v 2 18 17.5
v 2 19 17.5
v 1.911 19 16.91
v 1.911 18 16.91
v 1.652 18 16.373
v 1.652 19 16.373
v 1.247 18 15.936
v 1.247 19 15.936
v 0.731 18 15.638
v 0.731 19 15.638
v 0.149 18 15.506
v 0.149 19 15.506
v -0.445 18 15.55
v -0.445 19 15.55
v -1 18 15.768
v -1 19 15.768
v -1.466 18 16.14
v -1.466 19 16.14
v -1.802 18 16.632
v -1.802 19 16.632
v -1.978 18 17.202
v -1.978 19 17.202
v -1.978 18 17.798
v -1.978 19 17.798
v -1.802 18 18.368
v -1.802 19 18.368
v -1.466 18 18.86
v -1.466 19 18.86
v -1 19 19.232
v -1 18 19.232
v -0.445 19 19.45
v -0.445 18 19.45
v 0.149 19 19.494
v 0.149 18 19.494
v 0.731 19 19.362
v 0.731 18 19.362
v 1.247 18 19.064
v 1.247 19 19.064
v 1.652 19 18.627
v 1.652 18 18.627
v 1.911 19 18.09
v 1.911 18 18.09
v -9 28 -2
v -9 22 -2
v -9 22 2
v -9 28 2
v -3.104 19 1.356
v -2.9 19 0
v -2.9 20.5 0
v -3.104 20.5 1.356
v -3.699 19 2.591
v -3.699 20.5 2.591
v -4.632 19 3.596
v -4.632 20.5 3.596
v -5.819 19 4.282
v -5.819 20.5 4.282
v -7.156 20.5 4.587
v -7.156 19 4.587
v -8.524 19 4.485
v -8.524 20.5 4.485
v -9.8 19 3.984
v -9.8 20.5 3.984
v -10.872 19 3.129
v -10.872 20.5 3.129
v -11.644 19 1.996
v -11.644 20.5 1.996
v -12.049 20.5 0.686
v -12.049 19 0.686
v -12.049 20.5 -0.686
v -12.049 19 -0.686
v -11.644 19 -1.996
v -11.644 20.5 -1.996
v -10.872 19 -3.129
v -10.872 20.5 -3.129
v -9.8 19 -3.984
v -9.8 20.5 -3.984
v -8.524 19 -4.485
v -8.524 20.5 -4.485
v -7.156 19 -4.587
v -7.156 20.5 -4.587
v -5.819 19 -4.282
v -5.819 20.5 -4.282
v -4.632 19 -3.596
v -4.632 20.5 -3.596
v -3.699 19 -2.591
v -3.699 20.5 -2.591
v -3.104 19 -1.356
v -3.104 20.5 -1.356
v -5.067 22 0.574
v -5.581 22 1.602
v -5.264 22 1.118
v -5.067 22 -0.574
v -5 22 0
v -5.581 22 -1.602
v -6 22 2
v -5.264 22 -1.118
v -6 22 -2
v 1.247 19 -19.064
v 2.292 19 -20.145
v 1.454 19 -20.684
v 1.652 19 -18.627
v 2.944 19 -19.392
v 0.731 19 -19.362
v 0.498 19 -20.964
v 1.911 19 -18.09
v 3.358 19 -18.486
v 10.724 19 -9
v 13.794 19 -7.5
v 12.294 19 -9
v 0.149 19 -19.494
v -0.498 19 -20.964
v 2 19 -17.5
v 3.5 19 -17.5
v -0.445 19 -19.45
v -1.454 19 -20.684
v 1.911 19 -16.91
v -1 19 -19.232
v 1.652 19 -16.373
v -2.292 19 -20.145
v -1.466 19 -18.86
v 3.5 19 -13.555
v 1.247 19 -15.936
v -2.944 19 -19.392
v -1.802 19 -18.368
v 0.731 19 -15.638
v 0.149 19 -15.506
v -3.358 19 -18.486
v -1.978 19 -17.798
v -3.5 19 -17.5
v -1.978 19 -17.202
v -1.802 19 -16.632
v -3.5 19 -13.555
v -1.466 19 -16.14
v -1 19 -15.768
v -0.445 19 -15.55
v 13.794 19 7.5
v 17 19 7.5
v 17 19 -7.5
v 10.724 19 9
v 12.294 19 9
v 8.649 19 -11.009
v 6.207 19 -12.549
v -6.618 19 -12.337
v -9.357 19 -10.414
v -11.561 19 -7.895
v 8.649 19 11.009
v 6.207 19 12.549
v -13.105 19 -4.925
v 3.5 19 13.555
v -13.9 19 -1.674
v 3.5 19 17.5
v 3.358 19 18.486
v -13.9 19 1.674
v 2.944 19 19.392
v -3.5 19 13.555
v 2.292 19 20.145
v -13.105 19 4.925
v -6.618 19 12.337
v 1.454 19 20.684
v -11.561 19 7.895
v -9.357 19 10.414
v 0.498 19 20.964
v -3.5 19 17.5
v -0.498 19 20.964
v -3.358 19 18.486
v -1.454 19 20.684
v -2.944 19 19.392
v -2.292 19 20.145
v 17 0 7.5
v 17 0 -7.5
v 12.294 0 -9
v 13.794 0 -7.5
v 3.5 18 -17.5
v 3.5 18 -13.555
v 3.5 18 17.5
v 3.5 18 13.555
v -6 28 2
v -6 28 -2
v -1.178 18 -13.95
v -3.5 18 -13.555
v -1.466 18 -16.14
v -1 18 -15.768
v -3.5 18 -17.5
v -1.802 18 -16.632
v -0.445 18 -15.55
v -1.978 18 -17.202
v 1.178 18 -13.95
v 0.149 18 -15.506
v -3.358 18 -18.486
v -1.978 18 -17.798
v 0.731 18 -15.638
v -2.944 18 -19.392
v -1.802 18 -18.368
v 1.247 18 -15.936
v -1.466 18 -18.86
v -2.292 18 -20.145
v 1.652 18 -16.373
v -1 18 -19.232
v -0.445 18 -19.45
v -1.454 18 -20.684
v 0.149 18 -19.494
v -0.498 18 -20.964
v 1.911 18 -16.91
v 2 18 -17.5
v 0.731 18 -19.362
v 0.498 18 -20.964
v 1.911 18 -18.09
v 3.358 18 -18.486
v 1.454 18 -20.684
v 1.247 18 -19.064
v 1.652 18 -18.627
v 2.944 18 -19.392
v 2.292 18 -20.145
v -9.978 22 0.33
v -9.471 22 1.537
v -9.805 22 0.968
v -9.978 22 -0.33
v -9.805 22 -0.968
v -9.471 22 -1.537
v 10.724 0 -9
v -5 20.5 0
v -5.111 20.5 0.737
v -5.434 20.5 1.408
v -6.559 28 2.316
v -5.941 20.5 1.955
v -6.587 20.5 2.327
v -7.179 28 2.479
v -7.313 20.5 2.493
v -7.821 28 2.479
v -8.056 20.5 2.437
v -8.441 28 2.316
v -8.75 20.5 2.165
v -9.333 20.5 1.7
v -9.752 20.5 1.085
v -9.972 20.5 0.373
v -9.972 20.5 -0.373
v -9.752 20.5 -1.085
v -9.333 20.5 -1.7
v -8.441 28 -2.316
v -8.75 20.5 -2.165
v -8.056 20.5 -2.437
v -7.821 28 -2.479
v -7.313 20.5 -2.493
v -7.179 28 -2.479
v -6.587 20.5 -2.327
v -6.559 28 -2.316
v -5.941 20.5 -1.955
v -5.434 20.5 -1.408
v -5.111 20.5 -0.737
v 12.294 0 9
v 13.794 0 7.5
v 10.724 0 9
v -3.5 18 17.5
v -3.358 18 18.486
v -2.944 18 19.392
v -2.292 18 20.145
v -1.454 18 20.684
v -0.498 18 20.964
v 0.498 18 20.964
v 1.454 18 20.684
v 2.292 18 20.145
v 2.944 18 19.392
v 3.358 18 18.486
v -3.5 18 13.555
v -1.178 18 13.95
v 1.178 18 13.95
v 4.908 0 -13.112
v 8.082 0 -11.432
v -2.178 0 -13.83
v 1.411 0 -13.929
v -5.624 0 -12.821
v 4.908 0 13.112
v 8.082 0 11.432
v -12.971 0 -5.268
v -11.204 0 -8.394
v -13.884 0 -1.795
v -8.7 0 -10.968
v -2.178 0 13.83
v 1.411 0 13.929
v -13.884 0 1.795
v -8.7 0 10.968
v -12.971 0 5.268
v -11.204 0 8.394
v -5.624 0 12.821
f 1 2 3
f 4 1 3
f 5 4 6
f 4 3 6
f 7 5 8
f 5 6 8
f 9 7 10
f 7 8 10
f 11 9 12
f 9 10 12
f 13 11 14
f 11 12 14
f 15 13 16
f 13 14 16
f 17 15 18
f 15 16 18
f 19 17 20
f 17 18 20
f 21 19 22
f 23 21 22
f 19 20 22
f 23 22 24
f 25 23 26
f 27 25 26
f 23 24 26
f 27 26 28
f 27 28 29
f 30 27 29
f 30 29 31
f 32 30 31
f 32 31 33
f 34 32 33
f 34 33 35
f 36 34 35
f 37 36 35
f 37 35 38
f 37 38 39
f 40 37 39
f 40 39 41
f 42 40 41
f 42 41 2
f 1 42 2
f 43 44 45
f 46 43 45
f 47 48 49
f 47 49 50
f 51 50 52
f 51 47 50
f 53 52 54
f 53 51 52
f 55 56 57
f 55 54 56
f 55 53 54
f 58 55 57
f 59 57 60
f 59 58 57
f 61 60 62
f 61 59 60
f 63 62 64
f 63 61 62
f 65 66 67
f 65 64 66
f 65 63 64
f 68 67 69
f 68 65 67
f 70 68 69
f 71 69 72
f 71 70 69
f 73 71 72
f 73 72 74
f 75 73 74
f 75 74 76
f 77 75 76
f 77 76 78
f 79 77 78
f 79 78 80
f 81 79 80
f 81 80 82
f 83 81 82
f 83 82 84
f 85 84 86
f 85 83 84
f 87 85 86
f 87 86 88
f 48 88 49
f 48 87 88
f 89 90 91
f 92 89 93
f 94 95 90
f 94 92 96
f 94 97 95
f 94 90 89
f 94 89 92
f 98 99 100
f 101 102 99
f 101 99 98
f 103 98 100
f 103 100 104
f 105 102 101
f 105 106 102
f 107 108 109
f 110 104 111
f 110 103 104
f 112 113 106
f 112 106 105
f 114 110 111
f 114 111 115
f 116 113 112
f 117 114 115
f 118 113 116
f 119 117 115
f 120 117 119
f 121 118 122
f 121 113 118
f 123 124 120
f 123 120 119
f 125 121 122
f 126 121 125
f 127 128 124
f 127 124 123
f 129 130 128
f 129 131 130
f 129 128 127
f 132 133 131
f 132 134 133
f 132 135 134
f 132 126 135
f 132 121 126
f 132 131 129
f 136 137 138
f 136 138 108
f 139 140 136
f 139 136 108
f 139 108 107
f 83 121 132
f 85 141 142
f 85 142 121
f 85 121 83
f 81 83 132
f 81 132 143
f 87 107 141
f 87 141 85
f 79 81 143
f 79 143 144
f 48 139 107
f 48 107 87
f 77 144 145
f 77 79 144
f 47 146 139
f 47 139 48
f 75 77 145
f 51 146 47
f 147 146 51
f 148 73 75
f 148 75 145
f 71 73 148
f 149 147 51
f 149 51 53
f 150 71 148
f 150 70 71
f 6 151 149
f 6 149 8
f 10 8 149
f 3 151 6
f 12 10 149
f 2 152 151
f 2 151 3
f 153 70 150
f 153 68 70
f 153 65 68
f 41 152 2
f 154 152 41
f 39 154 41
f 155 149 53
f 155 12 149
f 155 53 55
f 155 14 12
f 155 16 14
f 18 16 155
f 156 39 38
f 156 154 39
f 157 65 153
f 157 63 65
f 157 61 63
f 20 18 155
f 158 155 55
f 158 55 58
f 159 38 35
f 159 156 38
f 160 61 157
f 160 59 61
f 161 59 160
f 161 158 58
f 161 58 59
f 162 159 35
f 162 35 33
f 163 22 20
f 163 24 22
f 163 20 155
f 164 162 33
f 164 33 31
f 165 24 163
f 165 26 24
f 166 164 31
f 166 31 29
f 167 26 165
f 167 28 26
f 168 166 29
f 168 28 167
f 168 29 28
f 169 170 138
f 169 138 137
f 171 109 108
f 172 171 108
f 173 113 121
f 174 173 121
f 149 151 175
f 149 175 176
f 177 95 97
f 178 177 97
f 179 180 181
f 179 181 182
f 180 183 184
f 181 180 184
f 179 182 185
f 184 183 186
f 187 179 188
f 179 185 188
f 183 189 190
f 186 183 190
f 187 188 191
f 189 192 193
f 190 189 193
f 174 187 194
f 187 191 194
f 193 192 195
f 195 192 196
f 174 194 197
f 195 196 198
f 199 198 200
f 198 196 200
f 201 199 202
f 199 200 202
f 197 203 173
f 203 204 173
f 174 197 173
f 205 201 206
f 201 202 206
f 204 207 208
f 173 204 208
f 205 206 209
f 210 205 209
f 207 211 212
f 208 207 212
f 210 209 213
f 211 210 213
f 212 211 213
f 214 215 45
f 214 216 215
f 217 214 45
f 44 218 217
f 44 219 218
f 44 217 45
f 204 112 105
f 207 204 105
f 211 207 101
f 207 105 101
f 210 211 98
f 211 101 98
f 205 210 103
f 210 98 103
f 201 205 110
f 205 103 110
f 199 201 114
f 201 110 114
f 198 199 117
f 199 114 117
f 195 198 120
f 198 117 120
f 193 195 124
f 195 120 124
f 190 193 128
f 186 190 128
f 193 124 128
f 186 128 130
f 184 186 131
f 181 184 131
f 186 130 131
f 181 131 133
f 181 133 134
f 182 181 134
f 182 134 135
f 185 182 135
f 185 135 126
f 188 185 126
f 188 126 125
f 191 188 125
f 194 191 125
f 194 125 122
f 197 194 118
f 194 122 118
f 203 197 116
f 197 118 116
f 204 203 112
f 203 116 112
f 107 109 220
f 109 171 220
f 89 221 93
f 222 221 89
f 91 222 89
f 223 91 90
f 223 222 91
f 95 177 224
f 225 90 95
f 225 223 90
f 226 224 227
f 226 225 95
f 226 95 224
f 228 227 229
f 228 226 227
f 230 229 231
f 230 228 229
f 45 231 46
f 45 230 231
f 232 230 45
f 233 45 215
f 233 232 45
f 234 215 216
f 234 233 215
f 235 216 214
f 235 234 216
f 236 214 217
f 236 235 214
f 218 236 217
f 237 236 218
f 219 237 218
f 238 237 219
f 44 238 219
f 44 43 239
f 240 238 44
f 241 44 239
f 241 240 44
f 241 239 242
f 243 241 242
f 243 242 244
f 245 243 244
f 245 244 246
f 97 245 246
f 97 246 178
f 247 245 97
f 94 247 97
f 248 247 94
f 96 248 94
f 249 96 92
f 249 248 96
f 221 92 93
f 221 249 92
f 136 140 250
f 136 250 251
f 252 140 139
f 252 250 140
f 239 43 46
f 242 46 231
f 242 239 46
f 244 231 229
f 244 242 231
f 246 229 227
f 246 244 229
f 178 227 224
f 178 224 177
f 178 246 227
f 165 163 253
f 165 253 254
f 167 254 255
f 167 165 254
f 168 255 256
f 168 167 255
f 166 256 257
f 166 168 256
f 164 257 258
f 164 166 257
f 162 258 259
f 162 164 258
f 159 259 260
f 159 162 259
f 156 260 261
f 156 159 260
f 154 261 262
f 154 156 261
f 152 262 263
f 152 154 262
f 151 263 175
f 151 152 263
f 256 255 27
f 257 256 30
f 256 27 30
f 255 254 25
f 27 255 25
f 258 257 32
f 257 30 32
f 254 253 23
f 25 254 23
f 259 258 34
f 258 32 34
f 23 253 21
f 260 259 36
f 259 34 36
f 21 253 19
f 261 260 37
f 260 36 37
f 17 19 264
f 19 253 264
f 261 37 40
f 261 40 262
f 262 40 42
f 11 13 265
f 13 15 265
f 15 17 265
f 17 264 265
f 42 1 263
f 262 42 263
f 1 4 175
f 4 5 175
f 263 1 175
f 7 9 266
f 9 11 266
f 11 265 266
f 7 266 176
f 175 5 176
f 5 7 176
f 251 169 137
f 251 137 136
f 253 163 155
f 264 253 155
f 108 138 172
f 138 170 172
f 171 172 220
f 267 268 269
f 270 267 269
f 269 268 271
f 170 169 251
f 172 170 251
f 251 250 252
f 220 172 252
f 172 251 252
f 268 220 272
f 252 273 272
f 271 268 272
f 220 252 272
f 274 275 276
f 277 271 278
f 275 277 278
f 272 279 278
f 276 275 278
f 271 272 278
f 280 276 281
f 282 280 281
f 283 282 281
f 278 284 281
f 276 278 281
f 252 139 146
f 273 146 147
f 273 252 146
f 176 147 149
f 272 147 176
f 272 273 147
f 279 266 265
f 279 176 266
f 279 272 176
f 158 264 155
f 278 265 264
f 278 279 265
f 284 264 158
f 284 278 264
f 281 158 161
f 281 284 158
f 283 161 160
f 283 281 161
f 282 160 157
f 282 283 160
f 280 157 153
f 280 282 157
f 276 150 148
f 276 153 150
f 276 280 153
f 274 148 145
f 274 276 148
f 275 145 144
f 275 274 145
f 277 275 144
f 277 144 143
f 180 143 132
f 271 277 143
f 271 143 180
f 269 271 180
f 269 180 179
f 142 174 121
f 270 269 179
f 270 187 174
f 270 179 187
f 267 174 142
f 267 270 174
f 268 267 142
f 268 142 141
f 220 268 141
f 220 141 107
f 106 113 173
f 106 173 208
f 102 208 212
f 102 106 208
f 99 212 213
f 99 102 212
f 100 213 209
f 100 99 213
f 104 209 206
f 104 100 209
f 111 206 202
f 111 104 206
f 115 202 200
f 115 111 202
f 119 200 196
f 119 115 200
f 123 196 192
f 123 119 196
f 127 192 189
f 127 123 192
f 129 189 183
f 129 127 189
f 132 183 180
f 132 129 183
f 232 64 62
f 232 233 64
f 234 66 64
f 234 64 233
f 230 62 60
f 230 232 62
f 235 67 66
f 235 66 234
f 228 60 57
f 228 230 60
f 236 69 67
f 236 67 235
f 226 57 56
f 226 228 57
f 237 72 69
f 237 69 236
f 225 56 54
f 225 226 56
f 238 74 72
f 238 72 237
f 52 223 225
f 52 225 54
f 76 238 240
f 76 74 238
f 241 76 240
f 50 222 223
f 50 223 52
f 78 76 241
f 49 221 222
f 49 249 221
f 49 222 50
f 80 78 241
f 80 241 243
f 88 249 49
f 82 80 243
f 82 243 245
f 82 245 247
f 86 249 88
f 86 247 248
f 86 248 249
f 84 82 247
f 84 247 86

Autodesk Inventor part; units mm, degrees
ref_plane "YZ Plane" through (0, 0, 0) normal (1, 0, 0) x (0, 1, 0)
ref_plane "XZ Plane" through (0, 0, 0) normal (0, 1, 0) x (-1, 0, 0)
ref_plane "XY Plane" through (0, 0, 0) normal (0, 0, 1) x (1, 0, 0)
sketch "Sketch1" plane through (0, 0, 0) normal (0, 1, 0) x (-1, 0, 0)
  line L0 (-12.2941, 0) -> (-17, 0)
  line L1 (-17, 0) -> (-17, 7.5)
  line L2 (0, 0) -> (-12.2941, 0)
  line L3 (-12.2941, 9) -> (-10.7238, 9)
  line L4 (-12.2941, 9) -> (-13.7941, 7.5)
  line L5 (-12.2941, 9) -> (-9.8817, 9) construction
  arc A0 (-10.7238, -9) -> (-10.7238, 9) centre (0, 0) ccw
  line L6 (-17, 7.5) -> (-13.7941, 7.5)
  line L7 (-17, 0) -> (-17, -7.5)
  line L8 (-12.2941, -9) -> (-10.7238, -9)
  line L9 (-12.2941, -9) -> (-13.7941, -7.5)
  line L10 (-12.2941, -9) -> (-9.8817, -9) construction
  line L11 (-17, -7.5) -> (-13.7941, -7.5)
  dimension "d3" = 9
  dimension "d4" = 135
extrude "Extrusion1" add sketch "Sketch1" along normal blind 19
sketch "Sketch2" plane through (0, 19, 0) normal (0, 1, 0) x (1, 0, 0)
  circle A0 centre (-7.5, 0) radius 4.6
  circle A1 centre (-7.5, 0) radius 2.5
  arc A2 (10.7238, 9) -> (10.7238, -9) centre (0, 0) ccw projected
  line L0 (-6, -2) -> (-6, 2)
  line L1 (-9, 2) -> (-9, -2)
  circle A3 centre (0, -17.5) radius 2
  arc A4 (-3.5, -17.5) -> (3.5, -17.5) centre (0, -17.5) ccw
  line L2 (-3.5, -17.5) -> (-3.5, -13.5554)
  line L3 (3.5, -17.5) -> (3.5, -13.5554)
  arc A5 (-3.5, -13.5554) -> (3.5, -13.5554) centre (0, 0) ccw
  line L4 (0, 0) -> (2, 0)
  arc A6 (10.7238, 9) -> (10.7238, -9) centre (0, 0) ccw
  circle A7 centre (0, 17.5) radius 2
  arc A8 (3.5, 17.5) -> (-3.5, 17.5) centre (0, 17.5) ccw
  line L5 (-3.5, 17.5) -> (-3.5, 13.5554)
  line L6 (3.5, 17.5) -> (3.5, 13.5554)
  arc A9 (3.5, 13.5554) -> (-3.5, 13.5554) centre (0, 0) ccw
  point P0 (-7.5, -3.3735)
  dimension "d7" = 5
  dimension "d8" = 9.2
  dimension "d9" = 0
  dimension "d10" = 7.5
  dimension "d12" = 0
  dimension "d13" = 3
  dimension "d14" = 4
  dimension "d15" = 0
  dimension "d16" = 17.5
  dimension "d17" = 7
extrude "Extrusion2" add sketch "Sketch2" against normal blind 1 contours A2 L3 A4 L2 | A2 L5 A8 L6
extrude "Extrusion3" add sketch "Sketch2" along normal blind 9 contours L0 A1 L1
extrude "Extrusion4" add sketch "Sketch2" along normal blind 3 contours A1 L0 | L0 A1 L1 | L1 A1
extrude "Extrusion5" add sketch "Sketch2" along normal blind 1.5 contours A0
sketch "Sketch4" plane through (0, 19, 0) normal (0, 1, 0) x (1, 0, 0)
  point P0 (0, 0)
properties part number "stepper_motor"
